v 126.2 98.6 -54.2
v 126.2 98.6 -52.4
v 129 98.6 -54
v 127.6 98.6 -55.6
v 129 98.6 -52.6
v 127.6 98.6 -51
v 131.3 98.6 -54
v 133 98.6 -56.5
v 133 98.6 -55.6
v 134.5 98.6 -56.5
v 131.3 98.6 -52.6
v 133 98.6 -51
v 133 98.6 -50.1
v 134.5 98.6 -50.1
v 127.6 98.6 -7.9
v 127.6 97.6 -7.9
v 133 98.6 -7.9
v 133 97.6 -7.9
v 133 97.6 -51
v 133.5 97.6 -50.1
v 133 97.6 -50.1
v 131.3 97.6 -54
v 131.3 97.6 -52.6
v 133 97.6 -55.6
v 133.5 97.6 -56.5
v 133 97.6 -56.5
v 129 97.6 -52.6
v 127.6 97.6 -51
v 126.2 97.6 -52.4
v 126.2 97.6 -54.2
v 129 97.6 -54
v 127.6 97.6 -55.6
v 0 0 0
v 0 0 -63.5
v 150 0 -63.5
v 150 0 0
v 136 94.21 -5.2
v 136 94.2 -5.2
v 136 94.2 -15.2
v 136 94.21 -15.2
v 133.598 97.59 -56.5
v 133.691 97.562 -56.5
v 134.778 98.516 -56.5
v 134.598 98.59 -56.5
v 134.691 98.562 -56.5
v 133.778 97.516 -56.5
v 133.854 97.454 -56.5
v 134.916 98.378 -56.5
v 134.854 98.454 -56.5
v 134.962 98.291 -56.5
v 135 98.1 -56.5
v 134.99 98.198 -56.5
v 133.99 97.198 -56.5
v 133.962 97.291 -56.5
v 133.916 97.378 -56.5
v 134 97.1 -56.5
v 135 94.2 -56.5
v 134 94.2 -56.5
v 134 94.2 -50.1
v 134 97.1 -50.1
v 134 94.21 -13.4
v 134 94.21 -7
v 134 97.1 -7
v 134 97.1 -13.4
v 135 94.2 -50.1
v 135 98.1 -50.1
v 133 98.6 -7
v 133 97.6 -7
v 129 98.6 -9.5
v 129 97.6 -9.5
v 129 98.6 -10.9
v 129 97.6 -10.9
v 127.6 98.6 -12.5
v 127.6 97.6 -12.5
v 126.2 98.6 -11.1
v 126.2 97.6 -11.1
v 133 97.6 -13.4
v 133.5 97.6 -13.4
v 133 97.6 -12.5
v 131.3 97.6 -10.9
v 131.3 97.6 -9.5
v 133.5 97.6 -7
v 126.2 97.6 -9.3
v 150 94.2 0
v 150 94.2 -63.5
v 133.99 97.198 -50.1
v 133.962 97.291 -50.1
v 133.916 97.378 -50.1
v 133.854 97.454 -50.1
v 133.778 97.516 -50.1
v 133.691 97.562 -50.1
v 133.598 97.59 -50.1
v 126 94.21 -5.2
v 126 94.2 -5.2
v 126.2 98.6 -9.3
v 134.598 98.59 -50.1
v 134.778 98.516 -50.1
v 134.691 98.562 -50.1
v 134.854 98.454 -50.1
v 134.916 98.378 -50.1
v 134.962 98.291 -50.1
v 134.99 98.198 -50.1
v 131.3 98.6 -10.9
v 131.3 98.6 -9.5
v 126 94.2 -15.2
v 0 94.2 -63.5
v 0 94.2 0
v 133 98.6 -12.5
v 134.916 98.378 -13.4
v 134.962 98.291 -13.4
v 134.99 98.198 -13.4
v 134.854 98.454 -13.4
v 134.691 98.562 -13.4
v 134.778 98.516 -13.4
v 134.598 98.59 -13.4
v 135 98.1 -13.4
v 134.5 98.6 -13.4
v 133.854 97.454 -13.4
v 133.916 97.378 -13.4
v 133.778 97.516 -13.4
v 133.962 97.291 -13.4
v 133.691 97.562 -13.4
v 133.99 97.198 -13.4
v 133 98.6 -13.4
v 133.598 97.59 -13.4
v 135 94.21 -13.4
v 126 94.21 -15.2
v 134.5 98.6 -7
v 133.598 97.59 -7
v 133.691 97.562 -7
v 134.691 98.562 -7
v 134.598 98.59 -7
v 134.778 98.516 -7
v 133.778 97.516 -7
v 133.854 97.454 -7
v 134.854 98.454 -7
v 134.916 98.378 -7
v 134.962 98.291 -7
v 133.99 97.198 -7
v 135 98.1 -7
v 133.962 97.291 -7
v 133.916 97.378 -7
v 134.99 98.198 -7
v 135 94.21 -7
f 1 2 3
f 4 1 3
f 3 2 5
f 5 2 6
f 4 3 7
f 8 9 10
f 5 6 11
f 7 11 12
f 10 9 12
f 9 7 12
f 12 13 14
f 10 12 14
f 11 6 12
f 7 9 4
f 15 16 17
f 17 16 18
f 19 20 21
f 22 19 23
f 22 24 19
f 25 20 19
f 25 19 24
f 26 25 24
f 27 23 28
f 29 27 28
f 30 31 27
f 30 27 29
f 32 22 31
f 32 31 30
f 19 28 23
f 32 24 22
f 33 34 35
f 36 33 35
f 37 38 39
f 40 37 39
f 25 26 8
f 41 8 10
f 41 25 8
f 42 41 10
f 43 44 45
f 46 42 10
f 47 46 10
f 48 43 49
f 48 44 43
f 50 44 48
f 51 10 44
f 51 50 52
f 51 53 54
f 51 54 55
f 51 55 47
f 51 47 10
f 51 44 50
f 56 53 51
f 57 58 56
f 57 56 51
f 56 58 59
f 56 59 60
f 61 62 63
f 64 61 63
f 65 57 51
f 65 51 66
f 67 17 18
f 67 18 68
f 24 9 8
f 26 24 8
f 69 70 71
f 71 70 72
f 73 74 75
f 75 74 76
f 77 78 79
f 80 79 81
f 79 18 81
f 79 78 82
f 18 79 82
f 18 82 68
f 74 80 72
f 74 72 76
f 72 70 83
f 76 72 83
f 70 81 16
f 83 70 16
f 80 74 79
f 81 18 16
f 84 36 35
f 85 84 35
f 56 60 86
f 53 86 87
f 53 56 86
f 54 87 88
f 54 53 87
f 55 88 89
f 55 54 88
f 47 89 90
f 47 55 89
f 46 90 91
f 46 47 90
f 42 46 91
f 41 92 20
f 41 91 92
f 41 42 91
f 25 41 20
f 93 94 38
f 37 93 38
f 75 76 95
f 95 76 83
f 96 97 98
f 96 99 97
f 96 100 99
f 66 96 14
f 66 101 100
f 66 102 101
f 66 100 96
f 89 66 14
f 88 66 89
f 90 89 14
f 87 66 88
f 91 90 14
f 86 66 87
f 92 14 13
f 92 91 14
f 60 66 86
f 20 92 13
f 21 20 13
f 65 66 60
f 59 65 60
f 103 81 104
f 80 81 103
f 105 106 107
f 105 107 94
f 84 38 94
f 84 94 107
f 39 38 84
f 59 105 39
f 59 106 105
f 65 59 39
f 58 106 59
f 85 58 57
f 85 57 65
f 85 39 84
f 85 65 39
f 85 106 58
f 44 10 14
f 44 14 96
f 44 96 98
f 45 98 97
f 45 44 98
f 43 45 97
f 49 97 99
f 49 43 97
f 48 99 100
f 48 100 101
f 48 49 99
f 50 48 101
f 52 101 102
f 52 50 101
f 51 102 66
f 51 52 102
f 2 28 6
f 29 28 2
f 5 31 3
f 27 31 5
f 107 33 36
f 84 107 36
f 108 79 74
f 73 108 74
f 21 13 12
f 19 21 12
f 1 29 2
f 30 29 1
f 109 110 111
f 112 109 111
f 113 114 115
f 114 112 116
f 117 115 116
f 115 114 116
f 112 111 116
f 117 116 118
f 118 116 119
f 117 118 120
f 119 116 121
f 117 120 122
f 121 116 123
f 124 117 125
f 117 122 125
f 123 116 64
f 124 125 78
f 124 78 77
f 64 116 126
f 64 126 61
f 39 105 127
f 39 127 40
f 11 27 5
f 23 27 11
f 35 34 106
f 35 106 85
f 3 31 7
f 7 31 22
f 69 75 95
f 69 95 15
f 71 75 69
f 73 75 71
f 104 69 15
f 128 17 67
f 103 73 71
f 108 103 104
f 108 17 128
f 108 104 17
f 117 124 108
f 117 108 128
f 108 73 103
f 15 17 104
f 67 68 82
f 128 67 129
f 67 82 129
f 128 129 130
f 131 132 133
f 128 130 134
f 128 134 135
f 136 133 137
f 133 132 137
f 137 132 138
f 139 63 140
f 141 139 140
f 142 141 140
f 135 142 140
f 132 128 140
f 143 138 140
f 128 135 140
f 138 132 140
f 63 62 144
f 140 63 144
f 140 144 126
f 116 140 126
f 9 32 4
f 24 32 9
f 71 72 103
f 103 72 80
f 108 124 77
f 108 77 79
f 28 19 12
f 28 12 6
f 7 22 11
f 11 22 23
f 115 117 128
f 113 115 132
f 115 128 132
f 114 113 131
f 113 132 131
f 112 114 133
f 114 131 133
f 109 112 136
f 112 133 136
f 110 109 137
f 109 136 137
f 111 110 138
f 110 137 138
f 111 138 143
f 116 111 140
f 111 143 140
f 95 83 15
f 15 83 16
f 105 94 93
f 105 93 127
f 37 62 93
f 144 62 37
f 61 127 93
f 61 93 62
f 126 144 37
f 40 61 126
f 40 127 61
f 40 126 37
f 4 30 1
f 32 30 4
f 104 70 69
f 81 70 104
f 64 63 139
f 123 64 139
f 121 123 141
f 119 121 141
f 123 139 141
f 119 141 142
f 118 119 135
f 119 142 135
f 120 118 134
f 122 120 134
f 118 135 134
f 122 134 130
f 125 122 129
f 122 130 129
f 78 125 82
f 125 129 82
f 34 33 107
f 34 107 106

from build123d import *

# Parameters (mm, degrees)
SKETCH1_W           = 150
SKETCH1_H           = 63.5
BOSS_EXTRUDE1_DEPTH = 94.2
SKETCH3_W           = 2.3
SKETCH3_H           = 1.4
BOSS_EXTRUDE2_DEPTH = 4.4
SKETCH4_W           = 6.8
SKETCH4_H           = 3.4
CUT_EXTRUDE1_DEPTH  = 189.186636082
SKETCH5_W           = 10
SKETCH5_H           = 10
BOSS_EXTRUDE3_DEPTH = 0.01


with BuildPart() as part:
    # Sketch1 → Boss-Extrude1 (new body)
    with BuildSketch(Plane(origin=(0, 0, 0), x_dir=(1, 0, 0), z_dir=(0, 1, 0))):
        with Locations((75, 31.75)):
            Rectangle(SKETCH1_W, SKETCH1_H)
    extrude(amount=BOSS_EXTRUDE1_DEPTH)

    # Sketch3 → Boss-Extrude2 (add)
    with BuildSketch(Plane(origin=(0, 94.2, 0), x_dir=(1, 0, 0), z_dir=(0, 1, 0))):
        Polygon((135, 7), (135, 13.4), (133, 13.4), (133, 12.5), (127.6, 12.5), (126.2, 11.1), (126.2, 9.3), (127.6, 7.9), (133, 7.9), (133, 7), align=None)
        with Locations((130.15, 10.2)):
            Rectangle(SKETCH3_W, SKETCH3_H, mode=Mode.SUBTRACT)
    boss_extrude2 = extrude(amount=BOSS_EXTRUDE2_DEPTH)

    # Sketch4 → Cut-Extrude1 (cut, through all)
    with BuildSketch(Plane.XY.offset(-7)):
        with Locations((129.6, 95.9)):
            Rectangle(SKETCH4_W, SKETCH4_H)
        with BuildLine():
            Line((133, 94.2), (134, 94.2))
            Line((134, 94.2), (134, 97.1))
            ThreePointArc((134, 97.1), (133.853553391, 97.453553391), (133.5, 97.6))
            Line((133.5, 97.6), (133, 97.6))
            Line((133, 97.6), (133, 94.2))
        make_face()
        with BuildLine():
            ThreePointArc((134.5, 98.6), (134.853553391, 98.453553391), (135, 98.1))
            Line((135, 98.1), (135, 98.6))
            Line((135, 98.6), (134.5, 98.6))
        make_face()
    cut_extrude1 = extrude(amount=-CUT_EXTRUDE1_DEPTH, mode=Mode.SUBTRACT)

    # Mirror1: Boss-Extrude2, Cut-Extrude1 across plane
    add(boss_extrude2.mirror(Plane.XY.offset(-31.75)))
    add(cut_extrude1.mirror(Plane.XY.offset(-31.75)), mode=Mode.SUBTRACT)

    # Sketch5 → Boss-Extrude3 (add)
    with BuildSketch(Plane(origin=(0, 94.2, 0), x_dir=(1, 0, 0), z_dir=(0, 1, 0))):
        with Locations((131, 10.2)):
            Rectangle(SKETCH5_W, SKETCH5_H)
    extrude(amount=BOSS_EXTRUDE3_DEPTH)


solid = part.part
